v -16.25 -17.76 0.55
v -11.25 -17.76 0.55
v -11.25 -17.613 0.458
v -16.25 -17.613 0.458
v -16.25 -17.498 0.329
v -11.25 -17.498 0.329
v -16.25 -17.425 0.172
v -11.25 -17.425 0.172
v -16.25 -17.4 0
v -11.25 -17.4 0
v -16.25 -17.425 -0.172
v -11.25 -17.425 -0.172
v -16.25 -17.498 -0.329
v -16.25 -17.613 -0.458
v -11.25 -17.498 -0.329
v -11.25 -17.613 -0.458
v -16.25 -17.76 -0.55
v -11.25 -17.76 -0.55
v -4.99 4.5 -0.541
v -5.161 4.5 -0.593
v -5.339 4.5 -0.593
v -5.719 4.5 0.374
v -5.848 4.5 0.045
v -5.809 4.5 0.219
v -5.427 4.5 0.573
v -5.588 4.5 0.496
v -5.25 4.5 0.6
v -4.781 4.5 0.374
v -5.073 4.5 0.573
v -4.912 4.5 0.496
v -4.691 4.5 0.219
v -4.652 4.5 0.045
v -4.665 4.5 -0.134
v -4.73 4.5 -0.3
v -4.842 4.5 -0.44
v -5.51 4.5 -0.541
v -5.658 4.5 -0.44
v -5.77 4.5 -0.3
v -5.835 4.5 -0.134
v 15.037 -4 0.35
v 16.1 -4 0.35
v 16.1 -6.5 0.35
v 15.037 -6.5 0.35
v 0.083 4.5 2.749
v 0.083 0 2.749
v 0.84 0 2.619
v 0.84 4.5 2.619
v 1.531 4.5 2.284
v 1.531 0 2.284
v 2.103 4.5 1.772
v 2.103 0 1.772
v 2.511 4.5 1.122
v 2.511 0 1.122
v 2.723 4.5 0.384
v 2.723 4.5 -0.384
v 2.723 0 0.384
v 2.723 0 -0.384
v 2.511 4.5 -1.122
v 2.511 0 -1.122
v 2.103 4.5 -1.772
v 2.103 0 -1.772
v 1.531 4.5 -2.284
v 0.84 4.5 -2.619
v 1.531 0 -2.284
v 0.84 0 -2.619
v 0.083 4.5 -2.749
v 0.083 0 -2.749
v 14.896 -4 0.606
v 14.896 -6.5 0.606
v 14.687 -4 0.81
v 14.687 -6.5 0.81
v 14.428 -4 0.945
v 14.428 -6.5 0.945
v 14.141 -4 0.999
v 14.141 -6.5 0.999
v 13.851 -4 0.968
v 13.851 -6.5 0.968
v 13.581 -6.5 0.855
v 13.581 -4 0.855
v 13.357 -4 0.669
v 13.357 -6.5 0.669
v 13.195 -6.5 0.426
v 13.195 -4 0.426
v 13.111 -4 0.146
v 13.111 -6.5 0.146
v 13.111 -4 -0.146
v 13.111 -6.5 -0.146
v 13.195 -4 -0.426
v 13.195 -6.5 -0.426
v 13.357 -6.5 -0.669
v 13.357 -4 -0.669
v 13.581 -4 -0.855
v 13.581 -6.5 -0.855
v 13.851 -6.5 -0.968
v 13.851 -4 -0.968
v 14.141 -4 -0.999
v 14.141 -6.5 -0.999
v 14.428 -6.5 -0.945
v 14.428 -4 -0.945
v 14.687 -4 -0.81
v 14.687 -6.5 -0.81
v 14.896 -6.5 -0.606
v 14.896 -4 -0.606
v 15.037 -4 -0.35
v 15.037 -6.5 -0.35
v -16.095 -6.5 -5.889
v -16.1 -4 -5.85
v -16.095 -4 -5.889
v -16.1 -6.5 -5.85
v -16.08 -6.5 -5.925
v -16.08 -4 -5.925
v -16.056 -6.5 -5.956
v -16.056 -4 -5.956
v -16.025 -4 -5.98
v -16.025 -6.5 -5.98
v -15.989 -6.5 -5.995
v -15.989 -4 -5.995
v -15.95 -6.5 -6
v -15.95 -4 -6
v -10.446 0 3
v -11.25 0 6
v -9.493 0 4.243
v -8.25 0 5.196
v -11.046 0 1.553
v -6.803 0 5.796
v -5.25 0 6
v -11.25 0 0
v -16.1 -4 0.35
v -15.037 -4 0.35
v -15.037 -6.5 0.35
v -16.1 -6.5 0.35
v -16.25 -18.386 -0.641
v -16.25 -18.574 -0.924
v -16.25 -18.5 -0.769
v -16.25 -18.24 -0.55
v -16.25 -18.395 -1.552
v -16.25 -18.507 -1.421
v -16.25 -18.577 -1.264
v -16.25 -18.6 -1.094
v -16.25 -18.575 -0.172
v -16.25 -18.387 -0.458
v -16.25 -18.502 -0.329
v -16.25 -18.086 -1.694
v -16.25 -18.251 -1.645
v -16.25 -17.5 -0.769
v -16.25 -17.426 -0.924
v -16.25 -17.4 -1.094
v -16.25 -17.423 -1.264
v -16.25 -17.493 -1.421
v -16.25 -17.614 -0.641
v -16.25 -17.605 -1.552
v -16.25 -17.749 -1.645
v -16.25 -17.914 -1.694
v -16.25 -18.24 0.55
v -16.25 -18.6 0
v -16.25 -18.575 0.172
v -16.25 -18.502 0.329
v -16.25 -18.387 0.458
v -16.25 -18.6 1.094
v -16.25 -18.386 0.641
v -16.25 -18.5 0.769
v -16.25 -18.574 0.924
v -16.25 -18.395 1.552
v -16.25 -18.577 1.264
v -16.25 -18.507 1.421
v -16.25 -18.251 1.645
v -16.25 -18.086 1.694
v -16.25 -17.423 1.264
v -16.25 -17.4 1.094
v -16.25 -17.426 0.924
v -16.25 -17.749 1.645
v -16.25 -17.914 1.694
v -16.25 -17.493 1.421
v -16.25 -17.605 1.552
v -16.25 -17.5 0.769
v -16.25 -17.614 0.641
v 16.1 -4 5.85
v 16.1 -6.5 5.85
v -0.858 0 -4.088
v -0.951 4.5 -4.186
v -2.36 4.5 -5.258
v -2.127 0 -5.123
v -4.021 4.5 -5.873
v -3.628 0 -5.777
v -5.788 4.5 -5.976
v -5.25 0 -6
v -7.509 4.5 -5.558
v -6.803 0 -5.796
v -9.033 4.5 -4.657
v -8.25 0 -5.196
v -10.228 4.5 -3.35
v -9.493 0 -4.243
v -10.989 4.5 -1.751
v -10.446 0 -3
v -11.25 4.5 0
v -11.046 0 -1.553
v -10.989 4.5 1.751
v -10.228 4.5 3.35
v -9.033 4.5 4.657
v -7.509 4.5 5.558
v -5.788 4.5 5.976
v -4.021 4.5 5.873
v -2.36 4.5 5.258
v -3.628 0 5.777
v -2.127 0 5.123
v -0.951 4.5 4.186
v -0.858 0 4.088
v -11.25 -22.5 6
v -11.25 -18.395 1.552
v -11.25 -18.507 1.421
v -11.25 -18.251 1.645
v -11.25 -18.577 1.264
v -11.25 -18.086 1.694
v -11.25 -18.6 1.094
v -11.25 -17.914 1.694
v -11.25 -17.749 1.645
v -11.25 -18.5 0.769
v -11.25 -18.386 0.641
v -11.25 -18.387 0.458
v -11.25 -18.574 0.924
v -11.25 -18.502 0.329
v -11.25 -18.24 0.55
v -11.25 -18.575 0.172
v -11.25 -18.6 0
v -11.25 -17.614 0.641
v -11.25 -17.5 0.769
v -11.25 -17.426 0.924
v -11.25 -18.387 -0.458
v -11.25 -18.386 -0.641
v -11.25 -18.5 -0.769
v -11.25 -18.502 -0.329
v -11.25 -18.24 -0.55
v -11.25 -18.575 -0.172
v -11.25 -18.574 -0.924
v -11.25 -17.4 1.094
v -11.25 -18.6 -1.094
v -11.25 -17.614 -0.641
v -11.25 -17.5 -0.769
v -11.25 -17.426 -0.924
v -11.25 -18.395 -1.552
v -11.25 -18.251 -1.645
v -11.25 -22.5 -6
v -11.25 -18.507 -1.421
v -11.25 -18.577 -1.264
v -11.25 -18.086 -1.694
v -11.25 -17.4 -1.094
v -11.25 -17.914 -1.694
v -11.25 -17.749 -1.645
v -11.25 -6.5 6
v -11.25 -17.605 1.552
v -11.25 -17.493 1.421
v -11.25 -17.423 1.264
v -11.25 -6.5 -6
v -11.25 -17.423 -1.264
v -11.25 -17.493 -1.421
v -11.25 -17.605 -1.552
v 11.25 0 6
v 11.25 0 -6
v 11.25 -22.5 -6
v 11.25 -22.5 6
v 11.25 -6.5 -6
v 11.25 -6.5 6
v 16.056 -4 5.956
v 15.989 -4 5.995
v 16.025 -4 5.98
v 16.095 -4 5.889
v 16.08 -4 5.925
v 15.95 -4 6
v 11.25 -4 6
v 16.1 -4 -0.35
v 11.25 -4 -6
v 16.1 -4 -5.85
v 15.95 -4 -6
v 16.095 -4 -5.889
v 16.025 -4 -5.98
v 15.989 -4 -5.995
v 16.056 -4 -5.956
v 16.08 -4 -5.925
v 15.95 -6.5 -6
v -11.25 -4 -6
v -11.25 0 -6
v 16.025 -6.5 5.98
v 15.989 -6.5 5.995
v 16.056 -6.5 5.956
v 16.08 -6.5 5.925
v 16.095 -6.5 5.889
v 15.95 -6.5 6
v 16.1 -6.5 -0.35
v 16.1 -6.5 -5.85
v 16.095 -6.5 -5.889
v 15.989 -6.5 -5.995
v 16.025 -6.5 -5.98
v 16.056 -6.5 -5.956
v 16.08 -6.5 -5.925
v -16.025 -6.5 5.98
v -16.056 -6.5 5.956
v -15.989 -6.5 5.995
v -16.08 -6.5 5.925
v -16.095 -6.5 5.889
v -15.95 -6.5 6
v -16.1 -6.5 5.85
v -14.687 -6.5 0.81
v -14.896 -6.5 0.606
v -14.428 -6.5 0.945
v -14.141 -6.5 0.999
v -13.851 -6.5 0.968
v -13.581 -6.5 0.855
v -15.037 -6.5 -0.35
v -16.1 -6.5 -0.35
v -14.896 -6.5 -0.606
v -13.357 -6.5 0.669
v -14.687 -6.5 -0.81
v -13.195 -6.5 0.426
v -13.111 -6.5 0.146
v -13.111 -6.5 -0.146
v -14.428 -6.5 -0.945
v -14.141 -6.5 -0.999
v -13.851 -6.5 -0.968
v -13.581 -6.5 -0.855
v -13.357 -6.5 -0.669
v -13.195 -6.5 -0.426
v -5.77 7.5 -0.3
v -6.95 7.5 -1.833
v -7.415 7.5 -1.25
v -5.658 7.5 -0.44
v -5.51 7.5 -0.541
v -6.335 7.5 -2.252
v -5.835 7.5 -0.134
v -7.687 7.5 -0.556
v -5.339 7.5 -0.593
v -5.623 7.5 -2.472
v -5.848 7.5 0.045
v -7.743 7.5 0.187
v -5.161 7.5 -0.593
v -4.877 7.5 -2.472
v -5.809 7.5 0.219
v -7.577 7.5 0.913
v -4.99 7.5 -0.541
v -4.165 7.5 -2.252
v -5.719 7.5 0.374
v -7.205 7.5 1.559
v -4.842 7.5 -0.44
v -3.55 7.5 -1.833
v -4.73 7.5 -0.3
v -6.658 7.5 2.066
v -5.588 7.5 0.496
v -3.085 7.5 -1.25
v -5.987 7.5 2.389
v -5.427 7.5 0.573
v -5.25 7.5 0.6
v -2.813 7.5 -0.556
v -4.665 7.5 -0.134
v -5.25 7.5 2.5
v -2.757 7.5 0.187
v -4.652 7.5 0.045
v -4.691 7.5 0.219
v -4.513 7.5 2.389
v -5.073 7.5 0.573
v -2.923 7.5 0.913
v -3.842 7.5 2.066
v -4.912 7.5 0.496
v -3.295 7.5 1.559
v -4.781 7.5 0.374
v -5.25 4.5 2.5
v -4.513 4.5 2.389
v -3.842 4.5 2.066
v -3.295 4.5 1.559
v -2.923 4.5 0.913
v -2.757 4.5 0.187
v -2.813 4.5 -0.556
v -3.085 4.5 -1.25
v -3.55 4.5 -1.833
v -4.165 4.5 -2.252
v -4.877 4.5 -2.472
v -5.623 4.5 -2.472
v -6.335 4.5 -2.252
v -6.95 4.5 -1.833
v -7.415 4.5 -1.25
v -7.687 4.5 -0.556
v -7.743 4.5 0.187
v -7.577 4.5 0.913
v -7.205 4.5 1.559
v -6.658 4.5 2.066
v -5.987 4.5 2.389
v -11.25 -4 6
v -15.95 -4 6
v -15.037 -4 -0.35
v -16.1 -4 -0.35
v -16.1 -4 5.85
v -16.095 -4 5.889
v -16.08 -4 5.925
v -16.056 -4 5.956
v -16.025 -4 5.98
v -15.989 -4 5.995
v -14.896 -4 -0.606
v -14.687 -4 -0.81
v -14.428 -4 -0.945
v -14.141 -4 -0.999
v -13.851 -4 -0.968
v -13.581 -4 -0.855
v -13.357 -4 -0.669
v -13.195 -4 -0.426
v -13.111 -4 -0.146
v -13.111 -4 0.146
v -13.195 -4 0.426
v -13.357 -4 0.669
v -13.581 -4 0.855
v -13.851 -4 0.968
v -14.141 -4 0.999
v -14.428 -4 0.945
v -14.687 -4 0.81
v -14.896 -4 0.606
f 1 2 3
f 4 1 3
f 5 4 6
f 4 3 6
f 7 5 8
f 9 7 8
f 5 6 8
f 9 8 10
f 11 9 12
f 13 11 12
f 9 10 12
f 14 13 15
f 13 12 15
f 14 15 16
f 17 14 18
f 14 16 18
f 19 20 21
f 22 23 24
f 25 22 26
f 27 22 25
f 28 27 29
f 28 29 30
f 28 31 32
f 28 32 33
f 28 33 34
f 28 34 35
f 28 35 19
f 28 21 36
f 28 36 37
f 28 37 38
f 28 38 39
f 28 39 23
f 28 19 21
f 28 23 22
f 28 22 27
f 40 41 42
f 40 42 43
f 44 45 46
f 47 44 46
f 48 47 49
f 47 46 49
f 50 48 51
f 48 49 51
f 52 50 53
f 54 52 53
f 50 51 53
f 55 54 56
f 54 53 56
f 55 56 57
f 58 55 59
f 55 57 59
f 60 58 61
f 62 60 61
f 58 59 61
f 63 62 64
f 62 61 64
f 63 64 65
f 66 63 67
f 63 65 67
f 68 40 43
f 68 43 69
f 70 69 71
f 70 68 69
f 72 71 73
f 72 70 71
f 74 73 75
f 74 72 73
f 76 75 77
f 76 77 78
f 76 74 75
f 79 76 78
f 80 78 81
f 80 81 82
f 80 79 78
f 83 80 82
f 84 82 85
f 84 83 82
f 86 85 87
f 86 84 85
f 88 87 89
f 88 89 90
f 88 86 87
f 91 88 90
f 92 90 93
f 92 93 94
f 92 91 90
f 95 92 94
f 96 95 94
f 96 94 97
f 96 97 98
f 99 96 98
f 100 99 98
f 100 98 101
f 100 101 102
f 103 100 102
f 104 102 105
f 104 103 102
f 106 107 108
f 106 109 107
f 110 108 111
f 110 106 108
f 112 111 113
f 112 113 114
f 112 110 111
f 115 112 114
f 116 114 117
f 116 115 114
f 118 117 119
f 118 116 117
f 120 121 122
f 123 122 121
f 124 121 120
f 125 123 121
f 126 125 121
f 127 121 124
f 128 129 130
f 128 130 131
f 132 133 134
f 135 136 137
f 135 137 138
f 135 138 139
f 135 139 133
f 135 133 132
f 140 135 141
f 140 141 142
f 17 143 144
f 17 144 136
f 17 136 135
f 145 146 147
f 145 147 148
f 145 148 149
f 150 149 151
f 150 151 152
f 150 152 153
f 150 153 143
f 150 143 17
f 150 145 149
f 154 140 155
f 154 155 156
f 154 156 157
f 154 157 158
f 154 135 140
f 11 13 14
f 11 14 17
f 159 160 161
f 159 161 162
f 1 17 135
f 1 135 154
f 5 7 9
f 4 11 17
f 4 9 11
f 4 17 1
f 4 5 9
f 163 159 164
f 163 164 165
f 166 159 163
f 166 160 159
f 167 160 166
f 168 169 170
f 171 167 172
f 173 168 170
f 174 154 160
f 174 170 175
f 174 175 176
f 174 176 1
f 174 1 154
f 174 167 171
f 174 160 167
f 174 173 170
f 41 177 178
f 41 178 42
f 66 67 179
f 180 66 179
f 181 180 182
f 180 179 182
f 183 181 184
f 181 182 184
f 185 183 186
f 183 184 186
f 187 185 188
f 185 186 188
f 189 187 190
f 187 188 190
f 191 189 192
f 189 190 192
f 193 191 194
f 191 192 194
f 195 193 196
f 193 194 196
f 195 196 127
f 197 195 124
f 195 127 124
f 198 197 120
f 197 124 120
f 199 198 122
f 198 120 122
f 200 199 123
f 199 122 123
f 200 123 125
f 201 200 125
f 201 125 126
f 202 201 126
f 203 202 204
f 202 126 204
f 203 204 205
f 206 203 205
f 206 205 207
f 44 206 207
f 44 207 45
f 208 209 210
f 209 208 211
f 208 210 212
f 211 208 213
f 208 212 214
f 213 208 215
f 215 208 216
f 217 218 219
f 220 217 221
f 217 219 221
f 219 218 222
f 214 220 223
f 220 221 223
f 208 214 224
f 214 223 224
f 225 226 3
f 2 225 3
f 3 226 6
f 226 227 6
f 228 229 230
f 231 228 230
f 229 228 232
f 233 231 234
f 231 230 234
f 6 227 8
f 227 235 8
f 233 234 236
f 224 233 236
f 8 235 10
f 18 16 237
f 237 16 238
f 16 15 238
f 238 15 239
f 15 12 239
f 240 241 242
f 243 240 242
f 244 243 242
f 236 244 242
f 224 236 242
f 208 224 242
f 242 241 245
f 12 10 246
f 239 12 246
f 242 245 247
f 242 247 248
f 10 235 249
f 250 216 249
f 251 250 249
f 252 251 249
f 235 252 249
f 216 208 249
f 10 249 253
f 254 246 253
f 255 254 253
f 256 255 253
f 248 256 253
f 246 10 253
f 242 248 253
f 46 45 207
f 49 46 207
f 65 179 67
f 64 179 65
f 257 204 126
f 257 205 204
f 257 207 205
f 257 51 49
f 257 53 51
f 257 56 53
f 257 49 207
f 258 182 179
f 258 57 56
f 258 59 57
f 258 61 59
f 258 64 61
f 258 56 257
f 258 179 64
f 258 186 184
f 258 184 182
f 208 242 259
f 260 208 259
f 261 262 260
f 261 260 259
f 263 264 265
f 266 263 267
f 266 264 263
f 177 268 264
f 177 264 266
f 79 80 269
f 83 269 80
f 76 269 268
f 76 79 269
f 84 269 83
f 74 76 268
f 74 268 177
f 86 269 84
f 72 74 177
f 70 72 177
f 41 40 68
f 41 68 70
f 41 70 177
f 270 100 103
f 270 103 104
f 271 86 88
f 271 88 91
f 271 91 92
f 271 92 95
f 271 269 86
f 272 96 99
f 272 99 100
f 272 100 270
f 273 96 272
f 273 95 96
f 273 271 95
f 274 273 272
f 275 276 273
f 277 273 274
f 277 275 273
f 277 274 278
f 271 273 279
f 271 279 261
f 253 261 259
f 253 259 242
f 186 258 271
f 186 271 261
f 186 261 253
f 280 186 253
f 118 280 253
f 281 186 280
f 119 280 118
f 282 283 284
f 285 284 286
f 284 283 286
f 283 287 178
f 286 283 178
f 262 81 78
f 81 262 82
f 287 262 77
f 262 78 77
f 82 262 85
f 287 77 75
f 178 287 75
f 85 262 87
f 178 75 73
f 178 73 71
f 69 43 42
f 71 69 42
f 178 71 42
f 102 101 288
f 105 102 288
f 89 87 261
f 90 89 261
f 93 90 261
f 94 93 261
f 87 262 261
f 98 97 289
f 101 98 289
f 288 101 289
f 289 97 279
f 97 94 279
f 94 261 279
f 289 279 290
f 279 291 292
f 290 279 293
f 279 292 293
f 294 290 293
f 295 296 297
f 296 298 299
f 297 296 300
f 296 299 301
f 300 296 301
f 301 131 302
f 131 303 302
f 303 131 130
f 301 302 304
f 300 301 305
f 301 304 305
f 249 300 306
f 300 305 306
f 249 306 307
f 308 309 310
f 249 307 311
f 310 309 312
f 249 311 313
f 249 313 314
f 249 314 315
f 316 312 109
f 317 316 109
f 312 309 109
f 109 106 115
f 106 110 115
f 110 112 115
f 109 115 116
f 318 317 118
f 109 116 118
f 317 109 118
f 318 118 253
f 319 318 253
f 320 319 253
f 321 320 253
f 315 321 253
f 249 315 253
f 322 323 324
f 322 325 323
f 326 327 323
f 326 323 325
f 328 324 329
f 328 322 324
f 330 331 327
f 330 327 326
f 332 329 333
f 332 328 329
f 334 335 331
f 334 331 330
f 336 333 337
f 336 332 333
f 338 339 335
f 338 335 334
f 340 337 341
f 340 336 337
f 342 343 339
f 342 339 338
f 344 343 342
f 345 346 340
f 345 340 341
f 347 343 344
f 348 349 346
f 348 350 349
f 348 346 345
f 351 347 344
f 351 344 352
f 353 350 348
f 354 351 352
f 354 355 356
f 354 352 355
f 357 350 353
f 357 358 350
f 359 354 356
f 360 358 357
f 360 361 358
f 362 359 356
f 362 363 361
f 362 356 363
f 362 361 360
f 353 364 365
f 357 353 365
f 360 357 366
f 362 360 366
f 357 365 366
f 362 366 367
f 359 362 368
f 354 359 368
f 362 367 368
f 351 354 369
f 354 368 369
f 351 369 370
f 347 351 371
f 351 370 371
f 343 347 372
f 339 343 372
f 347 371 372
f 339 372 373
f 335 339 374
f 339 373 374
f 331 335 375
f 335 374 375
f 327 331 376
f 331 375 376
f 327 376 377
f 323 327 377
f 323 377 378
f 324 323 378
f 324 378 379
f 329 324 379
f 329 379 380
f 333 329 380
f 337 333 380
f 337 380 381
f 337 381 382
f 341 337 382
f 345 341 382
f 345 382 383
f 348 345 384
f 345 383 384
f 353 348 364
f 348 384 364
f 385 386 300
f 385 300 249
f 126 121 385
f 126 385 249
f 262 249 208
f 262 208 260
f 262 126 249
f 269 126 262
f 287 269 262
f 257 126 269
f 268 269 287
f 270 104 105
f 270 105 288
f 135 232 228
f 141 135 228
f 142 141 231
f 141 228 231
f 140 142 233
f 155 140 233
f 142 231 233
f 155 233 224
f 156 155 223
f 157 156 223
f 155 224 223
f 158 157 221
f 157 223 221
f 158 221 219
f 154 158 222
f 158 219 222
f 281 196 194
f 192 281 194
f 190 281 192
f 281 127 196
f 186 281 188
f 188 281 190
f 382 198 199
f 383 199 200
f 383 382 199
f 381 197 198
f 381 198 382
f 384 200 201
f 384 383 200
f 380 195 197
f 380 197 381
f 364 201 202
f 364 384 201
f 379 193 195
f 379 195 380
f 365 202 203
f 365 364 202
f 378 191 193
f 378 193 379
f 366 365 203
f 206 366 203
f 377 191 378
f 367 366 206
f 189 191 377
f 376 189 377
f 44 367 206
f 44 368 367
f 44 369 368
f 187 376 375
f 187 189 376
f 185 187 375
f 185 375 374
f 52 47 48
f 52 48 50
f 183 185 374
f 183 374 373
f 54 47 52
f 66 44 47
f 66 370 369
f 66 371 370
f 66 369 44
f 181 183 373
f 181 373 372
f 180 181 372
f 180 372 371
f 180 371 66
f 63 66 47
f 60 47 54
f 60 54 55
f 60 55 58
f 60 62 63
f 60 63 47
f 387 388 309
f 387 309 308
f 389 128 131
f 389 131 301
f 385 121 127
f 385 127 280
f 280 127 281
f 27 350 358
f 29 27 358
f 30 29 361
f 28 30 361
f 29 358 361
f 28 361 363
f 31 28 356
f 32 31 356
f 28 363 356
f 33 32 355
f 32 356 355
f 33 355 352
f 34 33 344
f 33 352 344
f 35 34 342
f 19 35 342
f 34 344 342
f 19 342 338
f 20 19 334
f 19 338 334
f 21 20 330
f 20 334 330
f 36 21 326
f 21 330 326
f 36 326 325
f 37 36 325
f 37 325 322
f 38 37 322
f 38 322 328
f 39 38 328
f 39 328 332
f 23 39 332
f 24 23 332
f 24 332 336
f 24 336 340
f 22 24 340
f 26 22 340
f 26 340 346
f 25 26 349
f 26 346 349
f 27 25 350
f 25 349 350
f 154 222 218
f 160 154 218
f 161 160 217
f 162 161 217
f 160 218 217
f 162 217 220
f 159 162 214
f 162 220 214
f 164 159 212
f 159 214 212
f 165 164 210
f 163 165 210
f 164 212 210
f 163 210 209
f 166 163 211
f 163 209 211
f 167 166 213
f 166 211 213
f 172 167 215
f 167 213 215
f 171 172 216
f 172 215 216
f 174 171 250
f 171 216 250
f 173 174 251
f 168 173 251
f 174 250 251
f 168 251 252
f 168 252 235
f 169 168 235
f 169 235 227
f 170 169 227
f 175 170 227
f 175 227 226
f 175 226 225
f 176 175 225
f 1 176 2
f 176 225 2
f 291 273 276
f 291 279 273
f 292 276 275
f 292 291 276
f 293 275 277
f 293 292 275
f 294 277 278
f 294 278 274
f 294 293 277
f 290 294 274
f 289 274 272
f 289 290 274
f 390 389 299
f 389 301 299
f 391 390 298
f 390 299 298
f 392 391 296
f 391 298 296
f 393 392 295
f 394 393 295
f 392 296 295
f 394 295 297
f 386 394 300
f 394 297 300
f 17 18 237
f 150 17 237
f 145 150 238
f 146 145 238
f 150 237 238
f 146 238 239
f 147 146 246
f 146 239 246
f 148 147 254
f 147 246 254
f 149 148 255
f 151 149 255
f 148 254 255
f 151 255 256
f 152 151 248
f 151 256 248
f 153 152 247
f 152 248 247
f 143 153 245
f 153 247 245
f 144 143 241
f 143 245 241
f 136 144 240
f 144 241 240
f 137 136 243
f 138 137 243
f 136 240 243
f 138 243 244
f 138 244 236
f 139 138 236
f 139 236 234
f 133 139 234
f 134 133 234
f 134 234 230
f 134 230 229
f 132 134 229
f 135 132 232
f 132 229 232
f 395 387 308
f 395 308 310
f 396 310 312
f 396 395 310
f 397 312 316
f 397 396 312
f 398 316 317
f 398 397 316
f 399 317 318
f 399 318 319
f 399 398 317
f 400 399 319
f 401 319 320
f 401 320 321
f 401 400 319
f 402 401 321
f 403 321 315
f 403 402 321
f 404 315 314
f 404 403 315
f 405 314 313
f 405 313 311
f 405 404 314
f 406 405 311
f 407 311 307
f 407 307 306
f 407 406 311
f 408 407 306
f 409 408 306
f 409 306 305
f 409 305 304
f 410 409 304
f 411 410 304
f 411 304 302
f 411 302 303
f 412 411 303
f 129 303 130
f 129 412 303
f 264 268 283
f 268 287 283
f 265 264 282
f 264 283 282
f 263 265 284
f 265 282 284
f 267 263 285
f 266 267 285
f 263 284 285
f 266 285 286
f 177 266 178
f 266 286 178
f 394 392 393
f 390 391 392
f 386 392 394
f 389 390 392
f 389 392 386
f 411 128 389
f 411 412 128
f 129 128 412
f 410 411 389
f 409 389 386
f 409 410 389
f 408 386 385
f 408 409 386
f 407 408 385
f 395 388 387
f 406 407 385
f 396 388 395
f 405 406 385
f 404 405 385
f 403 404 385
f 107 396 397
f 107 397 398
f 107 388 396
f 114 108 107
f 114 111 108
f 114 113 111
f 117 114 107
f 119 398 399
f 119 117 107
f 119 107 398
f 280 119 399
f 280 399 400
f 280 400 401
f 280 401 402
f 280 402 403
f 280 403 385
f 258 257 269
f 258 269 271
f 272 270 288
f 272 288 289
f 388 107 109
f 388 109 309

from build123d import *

# Parameters (mm, degrees)
SKETCH_2_W          = 22.5
SKETCH_2_H          = 12
EXTRUDE_1_DEPTH     = 22.5
SKETCH_3_R          = 2.75
SKETCH_3_R_2        = 6
EXTRUDE_2_DEPTH     = 4.5
SKETCH_4_R          = 2.5
EXTRUDE_3_DEPTH     = 3
SKETCH_5_R          = 0.6
CUT_EXTRUDE_1_DEPTH = 3
EXTRUDE_4_DEPTH     = 2.5
FILLET_1_R          = 0.15
EXTRUDE_5_DEPTH     = 5


with BuildPart() as part:
    # ｽｹｯﾁ2 → ﾎﾞｽ - 押し出し1 (new body)
    with BuildSketch(Plane(origin=(0, 0, 0), x_dir=(1, 0, 0), z_dir=(0, 1, 0))):
        Rectangle(SKETCH_2_W, SKETCH_2_H)
    extrude(amount=-EXTRUDE_1_DEPTH)

    # ｽｹｯﾁ3 → ﾎﾞｽ - 押し出し2 (add)
    with BuildSketch(Plane(origin=(0, 0, 0), x_dir=(1, 0, 0), z_dir=(0, 1, 0))):
        Circle(SKETCH_3_R)
        with Locations((-5.25, 0)):
            Circle(SKETCH_3_R_2)
    extrude(amount=EXTRUDE_2_DEPTH)

    # ｽｹｯﾁ4 → ﾎﾞｽ - 押し出し3 (add)
    with BuildSketch(Plane(origin=(0, 4.5, 0), x_dir=(1, 0, 0), z_dir=(0, 1, 0))):
        with Locations(Location((-5.25, 0, 0), (0, 0, 270))):
            Circle(SKETCH_4_R)
    extrude(amount=EXTRUDE_3_DEPTH)

    # ｽｹｯﾁ5 → ｶｯﾄ - 押し出し1 (cut)
    with BuildSketch(Plane(origin=(0, 7.5, 0), x_dir=(1, 0, 0), z_dir=(0, 1, 0))):
        with Locations(Location((-5.25, 0, 0), (0, 0, 270))):
            Circle(SKETCH_5_R)
    extrude(amount=-CUT_EXTRUDE_1_DEPTH, mode=Mode.SUBTRACT)

    # ｽｹｯﾁ6 → ﾎﾞｽ - 押し出し4 (add)
    with BuildSketch(Plane(origin=(0, -4, 0), x_dir=(1, 0, 0), z_dir=(0, 1, 0))):
        with BuildLine():
            Line((-16.1, -0.35), (-16.1, -6))
            Line((-16.1, -6), (16.1, -6))
            Line((16.1, -6), (16.1, -0.35))
            Line((16.1, -0.35), (15.0367497, -0.35))
            ThreePointArc((15.0367497, -0.35), (13.1, 0), (15.0367497, 0.35))
            Line((15.0367497, 0.35), (16.1, 0.35))
            Line((16.1, 0.35), (16.1, 6))
            Line((16.1, 6), (-16.1, 6))
            Line((-16.1, 6), (-16.1, 0.35))
            Line((-16.1, 0.35), (-15.0367497, 0.35))
            ThreePointArc((-15.0367497, 0.35), (-13.1, 0), (-15.0367497, -0.35))
            Line((-15.0367497, -0.35), (-16.1, -0.35))
        make_face()
    extrude(amount=-EXTRUDE_4_DEPTH)

    # ﾌｨﾚｯﾄ1
    fillet_1_edges = [part.edges().sort_by_distance(p)[0] for p in [
        (16.1, -5.25, 6),
        (-16.1, -5.25, -6),
        (16.1, -5.25, -6),
        (-16.1, -5.25, 6),
    ]]
    fillet(fillet_1_edges, radius=FILLET_1_R)

    # ｽｹｯﾁ7 → ﾎﾞｽ - 押し出し5 (add)
    with BuildSketch(Plane.ZY.offset(11.25)):
        with BuildLine():
            ThreePointArc((-0.55, -18.239791576), (0, -18.6), (0.55, -18.239791576))
            ThreePointArc((0.55, -18.239791576), (1.7, -18), (0.55, -17.760208424))
            ThreePointArc((0.55, -17.760208424), (0, -17.4), (-0.55, -17.760208424))
            ThreePointArc((-0.55, -17.760208424), (-1.7, -18), (-0.55, -18.239791576))
        make_face()
    extrude(amount=EXTRUDE_5_DEPTH)


solid = part.part
